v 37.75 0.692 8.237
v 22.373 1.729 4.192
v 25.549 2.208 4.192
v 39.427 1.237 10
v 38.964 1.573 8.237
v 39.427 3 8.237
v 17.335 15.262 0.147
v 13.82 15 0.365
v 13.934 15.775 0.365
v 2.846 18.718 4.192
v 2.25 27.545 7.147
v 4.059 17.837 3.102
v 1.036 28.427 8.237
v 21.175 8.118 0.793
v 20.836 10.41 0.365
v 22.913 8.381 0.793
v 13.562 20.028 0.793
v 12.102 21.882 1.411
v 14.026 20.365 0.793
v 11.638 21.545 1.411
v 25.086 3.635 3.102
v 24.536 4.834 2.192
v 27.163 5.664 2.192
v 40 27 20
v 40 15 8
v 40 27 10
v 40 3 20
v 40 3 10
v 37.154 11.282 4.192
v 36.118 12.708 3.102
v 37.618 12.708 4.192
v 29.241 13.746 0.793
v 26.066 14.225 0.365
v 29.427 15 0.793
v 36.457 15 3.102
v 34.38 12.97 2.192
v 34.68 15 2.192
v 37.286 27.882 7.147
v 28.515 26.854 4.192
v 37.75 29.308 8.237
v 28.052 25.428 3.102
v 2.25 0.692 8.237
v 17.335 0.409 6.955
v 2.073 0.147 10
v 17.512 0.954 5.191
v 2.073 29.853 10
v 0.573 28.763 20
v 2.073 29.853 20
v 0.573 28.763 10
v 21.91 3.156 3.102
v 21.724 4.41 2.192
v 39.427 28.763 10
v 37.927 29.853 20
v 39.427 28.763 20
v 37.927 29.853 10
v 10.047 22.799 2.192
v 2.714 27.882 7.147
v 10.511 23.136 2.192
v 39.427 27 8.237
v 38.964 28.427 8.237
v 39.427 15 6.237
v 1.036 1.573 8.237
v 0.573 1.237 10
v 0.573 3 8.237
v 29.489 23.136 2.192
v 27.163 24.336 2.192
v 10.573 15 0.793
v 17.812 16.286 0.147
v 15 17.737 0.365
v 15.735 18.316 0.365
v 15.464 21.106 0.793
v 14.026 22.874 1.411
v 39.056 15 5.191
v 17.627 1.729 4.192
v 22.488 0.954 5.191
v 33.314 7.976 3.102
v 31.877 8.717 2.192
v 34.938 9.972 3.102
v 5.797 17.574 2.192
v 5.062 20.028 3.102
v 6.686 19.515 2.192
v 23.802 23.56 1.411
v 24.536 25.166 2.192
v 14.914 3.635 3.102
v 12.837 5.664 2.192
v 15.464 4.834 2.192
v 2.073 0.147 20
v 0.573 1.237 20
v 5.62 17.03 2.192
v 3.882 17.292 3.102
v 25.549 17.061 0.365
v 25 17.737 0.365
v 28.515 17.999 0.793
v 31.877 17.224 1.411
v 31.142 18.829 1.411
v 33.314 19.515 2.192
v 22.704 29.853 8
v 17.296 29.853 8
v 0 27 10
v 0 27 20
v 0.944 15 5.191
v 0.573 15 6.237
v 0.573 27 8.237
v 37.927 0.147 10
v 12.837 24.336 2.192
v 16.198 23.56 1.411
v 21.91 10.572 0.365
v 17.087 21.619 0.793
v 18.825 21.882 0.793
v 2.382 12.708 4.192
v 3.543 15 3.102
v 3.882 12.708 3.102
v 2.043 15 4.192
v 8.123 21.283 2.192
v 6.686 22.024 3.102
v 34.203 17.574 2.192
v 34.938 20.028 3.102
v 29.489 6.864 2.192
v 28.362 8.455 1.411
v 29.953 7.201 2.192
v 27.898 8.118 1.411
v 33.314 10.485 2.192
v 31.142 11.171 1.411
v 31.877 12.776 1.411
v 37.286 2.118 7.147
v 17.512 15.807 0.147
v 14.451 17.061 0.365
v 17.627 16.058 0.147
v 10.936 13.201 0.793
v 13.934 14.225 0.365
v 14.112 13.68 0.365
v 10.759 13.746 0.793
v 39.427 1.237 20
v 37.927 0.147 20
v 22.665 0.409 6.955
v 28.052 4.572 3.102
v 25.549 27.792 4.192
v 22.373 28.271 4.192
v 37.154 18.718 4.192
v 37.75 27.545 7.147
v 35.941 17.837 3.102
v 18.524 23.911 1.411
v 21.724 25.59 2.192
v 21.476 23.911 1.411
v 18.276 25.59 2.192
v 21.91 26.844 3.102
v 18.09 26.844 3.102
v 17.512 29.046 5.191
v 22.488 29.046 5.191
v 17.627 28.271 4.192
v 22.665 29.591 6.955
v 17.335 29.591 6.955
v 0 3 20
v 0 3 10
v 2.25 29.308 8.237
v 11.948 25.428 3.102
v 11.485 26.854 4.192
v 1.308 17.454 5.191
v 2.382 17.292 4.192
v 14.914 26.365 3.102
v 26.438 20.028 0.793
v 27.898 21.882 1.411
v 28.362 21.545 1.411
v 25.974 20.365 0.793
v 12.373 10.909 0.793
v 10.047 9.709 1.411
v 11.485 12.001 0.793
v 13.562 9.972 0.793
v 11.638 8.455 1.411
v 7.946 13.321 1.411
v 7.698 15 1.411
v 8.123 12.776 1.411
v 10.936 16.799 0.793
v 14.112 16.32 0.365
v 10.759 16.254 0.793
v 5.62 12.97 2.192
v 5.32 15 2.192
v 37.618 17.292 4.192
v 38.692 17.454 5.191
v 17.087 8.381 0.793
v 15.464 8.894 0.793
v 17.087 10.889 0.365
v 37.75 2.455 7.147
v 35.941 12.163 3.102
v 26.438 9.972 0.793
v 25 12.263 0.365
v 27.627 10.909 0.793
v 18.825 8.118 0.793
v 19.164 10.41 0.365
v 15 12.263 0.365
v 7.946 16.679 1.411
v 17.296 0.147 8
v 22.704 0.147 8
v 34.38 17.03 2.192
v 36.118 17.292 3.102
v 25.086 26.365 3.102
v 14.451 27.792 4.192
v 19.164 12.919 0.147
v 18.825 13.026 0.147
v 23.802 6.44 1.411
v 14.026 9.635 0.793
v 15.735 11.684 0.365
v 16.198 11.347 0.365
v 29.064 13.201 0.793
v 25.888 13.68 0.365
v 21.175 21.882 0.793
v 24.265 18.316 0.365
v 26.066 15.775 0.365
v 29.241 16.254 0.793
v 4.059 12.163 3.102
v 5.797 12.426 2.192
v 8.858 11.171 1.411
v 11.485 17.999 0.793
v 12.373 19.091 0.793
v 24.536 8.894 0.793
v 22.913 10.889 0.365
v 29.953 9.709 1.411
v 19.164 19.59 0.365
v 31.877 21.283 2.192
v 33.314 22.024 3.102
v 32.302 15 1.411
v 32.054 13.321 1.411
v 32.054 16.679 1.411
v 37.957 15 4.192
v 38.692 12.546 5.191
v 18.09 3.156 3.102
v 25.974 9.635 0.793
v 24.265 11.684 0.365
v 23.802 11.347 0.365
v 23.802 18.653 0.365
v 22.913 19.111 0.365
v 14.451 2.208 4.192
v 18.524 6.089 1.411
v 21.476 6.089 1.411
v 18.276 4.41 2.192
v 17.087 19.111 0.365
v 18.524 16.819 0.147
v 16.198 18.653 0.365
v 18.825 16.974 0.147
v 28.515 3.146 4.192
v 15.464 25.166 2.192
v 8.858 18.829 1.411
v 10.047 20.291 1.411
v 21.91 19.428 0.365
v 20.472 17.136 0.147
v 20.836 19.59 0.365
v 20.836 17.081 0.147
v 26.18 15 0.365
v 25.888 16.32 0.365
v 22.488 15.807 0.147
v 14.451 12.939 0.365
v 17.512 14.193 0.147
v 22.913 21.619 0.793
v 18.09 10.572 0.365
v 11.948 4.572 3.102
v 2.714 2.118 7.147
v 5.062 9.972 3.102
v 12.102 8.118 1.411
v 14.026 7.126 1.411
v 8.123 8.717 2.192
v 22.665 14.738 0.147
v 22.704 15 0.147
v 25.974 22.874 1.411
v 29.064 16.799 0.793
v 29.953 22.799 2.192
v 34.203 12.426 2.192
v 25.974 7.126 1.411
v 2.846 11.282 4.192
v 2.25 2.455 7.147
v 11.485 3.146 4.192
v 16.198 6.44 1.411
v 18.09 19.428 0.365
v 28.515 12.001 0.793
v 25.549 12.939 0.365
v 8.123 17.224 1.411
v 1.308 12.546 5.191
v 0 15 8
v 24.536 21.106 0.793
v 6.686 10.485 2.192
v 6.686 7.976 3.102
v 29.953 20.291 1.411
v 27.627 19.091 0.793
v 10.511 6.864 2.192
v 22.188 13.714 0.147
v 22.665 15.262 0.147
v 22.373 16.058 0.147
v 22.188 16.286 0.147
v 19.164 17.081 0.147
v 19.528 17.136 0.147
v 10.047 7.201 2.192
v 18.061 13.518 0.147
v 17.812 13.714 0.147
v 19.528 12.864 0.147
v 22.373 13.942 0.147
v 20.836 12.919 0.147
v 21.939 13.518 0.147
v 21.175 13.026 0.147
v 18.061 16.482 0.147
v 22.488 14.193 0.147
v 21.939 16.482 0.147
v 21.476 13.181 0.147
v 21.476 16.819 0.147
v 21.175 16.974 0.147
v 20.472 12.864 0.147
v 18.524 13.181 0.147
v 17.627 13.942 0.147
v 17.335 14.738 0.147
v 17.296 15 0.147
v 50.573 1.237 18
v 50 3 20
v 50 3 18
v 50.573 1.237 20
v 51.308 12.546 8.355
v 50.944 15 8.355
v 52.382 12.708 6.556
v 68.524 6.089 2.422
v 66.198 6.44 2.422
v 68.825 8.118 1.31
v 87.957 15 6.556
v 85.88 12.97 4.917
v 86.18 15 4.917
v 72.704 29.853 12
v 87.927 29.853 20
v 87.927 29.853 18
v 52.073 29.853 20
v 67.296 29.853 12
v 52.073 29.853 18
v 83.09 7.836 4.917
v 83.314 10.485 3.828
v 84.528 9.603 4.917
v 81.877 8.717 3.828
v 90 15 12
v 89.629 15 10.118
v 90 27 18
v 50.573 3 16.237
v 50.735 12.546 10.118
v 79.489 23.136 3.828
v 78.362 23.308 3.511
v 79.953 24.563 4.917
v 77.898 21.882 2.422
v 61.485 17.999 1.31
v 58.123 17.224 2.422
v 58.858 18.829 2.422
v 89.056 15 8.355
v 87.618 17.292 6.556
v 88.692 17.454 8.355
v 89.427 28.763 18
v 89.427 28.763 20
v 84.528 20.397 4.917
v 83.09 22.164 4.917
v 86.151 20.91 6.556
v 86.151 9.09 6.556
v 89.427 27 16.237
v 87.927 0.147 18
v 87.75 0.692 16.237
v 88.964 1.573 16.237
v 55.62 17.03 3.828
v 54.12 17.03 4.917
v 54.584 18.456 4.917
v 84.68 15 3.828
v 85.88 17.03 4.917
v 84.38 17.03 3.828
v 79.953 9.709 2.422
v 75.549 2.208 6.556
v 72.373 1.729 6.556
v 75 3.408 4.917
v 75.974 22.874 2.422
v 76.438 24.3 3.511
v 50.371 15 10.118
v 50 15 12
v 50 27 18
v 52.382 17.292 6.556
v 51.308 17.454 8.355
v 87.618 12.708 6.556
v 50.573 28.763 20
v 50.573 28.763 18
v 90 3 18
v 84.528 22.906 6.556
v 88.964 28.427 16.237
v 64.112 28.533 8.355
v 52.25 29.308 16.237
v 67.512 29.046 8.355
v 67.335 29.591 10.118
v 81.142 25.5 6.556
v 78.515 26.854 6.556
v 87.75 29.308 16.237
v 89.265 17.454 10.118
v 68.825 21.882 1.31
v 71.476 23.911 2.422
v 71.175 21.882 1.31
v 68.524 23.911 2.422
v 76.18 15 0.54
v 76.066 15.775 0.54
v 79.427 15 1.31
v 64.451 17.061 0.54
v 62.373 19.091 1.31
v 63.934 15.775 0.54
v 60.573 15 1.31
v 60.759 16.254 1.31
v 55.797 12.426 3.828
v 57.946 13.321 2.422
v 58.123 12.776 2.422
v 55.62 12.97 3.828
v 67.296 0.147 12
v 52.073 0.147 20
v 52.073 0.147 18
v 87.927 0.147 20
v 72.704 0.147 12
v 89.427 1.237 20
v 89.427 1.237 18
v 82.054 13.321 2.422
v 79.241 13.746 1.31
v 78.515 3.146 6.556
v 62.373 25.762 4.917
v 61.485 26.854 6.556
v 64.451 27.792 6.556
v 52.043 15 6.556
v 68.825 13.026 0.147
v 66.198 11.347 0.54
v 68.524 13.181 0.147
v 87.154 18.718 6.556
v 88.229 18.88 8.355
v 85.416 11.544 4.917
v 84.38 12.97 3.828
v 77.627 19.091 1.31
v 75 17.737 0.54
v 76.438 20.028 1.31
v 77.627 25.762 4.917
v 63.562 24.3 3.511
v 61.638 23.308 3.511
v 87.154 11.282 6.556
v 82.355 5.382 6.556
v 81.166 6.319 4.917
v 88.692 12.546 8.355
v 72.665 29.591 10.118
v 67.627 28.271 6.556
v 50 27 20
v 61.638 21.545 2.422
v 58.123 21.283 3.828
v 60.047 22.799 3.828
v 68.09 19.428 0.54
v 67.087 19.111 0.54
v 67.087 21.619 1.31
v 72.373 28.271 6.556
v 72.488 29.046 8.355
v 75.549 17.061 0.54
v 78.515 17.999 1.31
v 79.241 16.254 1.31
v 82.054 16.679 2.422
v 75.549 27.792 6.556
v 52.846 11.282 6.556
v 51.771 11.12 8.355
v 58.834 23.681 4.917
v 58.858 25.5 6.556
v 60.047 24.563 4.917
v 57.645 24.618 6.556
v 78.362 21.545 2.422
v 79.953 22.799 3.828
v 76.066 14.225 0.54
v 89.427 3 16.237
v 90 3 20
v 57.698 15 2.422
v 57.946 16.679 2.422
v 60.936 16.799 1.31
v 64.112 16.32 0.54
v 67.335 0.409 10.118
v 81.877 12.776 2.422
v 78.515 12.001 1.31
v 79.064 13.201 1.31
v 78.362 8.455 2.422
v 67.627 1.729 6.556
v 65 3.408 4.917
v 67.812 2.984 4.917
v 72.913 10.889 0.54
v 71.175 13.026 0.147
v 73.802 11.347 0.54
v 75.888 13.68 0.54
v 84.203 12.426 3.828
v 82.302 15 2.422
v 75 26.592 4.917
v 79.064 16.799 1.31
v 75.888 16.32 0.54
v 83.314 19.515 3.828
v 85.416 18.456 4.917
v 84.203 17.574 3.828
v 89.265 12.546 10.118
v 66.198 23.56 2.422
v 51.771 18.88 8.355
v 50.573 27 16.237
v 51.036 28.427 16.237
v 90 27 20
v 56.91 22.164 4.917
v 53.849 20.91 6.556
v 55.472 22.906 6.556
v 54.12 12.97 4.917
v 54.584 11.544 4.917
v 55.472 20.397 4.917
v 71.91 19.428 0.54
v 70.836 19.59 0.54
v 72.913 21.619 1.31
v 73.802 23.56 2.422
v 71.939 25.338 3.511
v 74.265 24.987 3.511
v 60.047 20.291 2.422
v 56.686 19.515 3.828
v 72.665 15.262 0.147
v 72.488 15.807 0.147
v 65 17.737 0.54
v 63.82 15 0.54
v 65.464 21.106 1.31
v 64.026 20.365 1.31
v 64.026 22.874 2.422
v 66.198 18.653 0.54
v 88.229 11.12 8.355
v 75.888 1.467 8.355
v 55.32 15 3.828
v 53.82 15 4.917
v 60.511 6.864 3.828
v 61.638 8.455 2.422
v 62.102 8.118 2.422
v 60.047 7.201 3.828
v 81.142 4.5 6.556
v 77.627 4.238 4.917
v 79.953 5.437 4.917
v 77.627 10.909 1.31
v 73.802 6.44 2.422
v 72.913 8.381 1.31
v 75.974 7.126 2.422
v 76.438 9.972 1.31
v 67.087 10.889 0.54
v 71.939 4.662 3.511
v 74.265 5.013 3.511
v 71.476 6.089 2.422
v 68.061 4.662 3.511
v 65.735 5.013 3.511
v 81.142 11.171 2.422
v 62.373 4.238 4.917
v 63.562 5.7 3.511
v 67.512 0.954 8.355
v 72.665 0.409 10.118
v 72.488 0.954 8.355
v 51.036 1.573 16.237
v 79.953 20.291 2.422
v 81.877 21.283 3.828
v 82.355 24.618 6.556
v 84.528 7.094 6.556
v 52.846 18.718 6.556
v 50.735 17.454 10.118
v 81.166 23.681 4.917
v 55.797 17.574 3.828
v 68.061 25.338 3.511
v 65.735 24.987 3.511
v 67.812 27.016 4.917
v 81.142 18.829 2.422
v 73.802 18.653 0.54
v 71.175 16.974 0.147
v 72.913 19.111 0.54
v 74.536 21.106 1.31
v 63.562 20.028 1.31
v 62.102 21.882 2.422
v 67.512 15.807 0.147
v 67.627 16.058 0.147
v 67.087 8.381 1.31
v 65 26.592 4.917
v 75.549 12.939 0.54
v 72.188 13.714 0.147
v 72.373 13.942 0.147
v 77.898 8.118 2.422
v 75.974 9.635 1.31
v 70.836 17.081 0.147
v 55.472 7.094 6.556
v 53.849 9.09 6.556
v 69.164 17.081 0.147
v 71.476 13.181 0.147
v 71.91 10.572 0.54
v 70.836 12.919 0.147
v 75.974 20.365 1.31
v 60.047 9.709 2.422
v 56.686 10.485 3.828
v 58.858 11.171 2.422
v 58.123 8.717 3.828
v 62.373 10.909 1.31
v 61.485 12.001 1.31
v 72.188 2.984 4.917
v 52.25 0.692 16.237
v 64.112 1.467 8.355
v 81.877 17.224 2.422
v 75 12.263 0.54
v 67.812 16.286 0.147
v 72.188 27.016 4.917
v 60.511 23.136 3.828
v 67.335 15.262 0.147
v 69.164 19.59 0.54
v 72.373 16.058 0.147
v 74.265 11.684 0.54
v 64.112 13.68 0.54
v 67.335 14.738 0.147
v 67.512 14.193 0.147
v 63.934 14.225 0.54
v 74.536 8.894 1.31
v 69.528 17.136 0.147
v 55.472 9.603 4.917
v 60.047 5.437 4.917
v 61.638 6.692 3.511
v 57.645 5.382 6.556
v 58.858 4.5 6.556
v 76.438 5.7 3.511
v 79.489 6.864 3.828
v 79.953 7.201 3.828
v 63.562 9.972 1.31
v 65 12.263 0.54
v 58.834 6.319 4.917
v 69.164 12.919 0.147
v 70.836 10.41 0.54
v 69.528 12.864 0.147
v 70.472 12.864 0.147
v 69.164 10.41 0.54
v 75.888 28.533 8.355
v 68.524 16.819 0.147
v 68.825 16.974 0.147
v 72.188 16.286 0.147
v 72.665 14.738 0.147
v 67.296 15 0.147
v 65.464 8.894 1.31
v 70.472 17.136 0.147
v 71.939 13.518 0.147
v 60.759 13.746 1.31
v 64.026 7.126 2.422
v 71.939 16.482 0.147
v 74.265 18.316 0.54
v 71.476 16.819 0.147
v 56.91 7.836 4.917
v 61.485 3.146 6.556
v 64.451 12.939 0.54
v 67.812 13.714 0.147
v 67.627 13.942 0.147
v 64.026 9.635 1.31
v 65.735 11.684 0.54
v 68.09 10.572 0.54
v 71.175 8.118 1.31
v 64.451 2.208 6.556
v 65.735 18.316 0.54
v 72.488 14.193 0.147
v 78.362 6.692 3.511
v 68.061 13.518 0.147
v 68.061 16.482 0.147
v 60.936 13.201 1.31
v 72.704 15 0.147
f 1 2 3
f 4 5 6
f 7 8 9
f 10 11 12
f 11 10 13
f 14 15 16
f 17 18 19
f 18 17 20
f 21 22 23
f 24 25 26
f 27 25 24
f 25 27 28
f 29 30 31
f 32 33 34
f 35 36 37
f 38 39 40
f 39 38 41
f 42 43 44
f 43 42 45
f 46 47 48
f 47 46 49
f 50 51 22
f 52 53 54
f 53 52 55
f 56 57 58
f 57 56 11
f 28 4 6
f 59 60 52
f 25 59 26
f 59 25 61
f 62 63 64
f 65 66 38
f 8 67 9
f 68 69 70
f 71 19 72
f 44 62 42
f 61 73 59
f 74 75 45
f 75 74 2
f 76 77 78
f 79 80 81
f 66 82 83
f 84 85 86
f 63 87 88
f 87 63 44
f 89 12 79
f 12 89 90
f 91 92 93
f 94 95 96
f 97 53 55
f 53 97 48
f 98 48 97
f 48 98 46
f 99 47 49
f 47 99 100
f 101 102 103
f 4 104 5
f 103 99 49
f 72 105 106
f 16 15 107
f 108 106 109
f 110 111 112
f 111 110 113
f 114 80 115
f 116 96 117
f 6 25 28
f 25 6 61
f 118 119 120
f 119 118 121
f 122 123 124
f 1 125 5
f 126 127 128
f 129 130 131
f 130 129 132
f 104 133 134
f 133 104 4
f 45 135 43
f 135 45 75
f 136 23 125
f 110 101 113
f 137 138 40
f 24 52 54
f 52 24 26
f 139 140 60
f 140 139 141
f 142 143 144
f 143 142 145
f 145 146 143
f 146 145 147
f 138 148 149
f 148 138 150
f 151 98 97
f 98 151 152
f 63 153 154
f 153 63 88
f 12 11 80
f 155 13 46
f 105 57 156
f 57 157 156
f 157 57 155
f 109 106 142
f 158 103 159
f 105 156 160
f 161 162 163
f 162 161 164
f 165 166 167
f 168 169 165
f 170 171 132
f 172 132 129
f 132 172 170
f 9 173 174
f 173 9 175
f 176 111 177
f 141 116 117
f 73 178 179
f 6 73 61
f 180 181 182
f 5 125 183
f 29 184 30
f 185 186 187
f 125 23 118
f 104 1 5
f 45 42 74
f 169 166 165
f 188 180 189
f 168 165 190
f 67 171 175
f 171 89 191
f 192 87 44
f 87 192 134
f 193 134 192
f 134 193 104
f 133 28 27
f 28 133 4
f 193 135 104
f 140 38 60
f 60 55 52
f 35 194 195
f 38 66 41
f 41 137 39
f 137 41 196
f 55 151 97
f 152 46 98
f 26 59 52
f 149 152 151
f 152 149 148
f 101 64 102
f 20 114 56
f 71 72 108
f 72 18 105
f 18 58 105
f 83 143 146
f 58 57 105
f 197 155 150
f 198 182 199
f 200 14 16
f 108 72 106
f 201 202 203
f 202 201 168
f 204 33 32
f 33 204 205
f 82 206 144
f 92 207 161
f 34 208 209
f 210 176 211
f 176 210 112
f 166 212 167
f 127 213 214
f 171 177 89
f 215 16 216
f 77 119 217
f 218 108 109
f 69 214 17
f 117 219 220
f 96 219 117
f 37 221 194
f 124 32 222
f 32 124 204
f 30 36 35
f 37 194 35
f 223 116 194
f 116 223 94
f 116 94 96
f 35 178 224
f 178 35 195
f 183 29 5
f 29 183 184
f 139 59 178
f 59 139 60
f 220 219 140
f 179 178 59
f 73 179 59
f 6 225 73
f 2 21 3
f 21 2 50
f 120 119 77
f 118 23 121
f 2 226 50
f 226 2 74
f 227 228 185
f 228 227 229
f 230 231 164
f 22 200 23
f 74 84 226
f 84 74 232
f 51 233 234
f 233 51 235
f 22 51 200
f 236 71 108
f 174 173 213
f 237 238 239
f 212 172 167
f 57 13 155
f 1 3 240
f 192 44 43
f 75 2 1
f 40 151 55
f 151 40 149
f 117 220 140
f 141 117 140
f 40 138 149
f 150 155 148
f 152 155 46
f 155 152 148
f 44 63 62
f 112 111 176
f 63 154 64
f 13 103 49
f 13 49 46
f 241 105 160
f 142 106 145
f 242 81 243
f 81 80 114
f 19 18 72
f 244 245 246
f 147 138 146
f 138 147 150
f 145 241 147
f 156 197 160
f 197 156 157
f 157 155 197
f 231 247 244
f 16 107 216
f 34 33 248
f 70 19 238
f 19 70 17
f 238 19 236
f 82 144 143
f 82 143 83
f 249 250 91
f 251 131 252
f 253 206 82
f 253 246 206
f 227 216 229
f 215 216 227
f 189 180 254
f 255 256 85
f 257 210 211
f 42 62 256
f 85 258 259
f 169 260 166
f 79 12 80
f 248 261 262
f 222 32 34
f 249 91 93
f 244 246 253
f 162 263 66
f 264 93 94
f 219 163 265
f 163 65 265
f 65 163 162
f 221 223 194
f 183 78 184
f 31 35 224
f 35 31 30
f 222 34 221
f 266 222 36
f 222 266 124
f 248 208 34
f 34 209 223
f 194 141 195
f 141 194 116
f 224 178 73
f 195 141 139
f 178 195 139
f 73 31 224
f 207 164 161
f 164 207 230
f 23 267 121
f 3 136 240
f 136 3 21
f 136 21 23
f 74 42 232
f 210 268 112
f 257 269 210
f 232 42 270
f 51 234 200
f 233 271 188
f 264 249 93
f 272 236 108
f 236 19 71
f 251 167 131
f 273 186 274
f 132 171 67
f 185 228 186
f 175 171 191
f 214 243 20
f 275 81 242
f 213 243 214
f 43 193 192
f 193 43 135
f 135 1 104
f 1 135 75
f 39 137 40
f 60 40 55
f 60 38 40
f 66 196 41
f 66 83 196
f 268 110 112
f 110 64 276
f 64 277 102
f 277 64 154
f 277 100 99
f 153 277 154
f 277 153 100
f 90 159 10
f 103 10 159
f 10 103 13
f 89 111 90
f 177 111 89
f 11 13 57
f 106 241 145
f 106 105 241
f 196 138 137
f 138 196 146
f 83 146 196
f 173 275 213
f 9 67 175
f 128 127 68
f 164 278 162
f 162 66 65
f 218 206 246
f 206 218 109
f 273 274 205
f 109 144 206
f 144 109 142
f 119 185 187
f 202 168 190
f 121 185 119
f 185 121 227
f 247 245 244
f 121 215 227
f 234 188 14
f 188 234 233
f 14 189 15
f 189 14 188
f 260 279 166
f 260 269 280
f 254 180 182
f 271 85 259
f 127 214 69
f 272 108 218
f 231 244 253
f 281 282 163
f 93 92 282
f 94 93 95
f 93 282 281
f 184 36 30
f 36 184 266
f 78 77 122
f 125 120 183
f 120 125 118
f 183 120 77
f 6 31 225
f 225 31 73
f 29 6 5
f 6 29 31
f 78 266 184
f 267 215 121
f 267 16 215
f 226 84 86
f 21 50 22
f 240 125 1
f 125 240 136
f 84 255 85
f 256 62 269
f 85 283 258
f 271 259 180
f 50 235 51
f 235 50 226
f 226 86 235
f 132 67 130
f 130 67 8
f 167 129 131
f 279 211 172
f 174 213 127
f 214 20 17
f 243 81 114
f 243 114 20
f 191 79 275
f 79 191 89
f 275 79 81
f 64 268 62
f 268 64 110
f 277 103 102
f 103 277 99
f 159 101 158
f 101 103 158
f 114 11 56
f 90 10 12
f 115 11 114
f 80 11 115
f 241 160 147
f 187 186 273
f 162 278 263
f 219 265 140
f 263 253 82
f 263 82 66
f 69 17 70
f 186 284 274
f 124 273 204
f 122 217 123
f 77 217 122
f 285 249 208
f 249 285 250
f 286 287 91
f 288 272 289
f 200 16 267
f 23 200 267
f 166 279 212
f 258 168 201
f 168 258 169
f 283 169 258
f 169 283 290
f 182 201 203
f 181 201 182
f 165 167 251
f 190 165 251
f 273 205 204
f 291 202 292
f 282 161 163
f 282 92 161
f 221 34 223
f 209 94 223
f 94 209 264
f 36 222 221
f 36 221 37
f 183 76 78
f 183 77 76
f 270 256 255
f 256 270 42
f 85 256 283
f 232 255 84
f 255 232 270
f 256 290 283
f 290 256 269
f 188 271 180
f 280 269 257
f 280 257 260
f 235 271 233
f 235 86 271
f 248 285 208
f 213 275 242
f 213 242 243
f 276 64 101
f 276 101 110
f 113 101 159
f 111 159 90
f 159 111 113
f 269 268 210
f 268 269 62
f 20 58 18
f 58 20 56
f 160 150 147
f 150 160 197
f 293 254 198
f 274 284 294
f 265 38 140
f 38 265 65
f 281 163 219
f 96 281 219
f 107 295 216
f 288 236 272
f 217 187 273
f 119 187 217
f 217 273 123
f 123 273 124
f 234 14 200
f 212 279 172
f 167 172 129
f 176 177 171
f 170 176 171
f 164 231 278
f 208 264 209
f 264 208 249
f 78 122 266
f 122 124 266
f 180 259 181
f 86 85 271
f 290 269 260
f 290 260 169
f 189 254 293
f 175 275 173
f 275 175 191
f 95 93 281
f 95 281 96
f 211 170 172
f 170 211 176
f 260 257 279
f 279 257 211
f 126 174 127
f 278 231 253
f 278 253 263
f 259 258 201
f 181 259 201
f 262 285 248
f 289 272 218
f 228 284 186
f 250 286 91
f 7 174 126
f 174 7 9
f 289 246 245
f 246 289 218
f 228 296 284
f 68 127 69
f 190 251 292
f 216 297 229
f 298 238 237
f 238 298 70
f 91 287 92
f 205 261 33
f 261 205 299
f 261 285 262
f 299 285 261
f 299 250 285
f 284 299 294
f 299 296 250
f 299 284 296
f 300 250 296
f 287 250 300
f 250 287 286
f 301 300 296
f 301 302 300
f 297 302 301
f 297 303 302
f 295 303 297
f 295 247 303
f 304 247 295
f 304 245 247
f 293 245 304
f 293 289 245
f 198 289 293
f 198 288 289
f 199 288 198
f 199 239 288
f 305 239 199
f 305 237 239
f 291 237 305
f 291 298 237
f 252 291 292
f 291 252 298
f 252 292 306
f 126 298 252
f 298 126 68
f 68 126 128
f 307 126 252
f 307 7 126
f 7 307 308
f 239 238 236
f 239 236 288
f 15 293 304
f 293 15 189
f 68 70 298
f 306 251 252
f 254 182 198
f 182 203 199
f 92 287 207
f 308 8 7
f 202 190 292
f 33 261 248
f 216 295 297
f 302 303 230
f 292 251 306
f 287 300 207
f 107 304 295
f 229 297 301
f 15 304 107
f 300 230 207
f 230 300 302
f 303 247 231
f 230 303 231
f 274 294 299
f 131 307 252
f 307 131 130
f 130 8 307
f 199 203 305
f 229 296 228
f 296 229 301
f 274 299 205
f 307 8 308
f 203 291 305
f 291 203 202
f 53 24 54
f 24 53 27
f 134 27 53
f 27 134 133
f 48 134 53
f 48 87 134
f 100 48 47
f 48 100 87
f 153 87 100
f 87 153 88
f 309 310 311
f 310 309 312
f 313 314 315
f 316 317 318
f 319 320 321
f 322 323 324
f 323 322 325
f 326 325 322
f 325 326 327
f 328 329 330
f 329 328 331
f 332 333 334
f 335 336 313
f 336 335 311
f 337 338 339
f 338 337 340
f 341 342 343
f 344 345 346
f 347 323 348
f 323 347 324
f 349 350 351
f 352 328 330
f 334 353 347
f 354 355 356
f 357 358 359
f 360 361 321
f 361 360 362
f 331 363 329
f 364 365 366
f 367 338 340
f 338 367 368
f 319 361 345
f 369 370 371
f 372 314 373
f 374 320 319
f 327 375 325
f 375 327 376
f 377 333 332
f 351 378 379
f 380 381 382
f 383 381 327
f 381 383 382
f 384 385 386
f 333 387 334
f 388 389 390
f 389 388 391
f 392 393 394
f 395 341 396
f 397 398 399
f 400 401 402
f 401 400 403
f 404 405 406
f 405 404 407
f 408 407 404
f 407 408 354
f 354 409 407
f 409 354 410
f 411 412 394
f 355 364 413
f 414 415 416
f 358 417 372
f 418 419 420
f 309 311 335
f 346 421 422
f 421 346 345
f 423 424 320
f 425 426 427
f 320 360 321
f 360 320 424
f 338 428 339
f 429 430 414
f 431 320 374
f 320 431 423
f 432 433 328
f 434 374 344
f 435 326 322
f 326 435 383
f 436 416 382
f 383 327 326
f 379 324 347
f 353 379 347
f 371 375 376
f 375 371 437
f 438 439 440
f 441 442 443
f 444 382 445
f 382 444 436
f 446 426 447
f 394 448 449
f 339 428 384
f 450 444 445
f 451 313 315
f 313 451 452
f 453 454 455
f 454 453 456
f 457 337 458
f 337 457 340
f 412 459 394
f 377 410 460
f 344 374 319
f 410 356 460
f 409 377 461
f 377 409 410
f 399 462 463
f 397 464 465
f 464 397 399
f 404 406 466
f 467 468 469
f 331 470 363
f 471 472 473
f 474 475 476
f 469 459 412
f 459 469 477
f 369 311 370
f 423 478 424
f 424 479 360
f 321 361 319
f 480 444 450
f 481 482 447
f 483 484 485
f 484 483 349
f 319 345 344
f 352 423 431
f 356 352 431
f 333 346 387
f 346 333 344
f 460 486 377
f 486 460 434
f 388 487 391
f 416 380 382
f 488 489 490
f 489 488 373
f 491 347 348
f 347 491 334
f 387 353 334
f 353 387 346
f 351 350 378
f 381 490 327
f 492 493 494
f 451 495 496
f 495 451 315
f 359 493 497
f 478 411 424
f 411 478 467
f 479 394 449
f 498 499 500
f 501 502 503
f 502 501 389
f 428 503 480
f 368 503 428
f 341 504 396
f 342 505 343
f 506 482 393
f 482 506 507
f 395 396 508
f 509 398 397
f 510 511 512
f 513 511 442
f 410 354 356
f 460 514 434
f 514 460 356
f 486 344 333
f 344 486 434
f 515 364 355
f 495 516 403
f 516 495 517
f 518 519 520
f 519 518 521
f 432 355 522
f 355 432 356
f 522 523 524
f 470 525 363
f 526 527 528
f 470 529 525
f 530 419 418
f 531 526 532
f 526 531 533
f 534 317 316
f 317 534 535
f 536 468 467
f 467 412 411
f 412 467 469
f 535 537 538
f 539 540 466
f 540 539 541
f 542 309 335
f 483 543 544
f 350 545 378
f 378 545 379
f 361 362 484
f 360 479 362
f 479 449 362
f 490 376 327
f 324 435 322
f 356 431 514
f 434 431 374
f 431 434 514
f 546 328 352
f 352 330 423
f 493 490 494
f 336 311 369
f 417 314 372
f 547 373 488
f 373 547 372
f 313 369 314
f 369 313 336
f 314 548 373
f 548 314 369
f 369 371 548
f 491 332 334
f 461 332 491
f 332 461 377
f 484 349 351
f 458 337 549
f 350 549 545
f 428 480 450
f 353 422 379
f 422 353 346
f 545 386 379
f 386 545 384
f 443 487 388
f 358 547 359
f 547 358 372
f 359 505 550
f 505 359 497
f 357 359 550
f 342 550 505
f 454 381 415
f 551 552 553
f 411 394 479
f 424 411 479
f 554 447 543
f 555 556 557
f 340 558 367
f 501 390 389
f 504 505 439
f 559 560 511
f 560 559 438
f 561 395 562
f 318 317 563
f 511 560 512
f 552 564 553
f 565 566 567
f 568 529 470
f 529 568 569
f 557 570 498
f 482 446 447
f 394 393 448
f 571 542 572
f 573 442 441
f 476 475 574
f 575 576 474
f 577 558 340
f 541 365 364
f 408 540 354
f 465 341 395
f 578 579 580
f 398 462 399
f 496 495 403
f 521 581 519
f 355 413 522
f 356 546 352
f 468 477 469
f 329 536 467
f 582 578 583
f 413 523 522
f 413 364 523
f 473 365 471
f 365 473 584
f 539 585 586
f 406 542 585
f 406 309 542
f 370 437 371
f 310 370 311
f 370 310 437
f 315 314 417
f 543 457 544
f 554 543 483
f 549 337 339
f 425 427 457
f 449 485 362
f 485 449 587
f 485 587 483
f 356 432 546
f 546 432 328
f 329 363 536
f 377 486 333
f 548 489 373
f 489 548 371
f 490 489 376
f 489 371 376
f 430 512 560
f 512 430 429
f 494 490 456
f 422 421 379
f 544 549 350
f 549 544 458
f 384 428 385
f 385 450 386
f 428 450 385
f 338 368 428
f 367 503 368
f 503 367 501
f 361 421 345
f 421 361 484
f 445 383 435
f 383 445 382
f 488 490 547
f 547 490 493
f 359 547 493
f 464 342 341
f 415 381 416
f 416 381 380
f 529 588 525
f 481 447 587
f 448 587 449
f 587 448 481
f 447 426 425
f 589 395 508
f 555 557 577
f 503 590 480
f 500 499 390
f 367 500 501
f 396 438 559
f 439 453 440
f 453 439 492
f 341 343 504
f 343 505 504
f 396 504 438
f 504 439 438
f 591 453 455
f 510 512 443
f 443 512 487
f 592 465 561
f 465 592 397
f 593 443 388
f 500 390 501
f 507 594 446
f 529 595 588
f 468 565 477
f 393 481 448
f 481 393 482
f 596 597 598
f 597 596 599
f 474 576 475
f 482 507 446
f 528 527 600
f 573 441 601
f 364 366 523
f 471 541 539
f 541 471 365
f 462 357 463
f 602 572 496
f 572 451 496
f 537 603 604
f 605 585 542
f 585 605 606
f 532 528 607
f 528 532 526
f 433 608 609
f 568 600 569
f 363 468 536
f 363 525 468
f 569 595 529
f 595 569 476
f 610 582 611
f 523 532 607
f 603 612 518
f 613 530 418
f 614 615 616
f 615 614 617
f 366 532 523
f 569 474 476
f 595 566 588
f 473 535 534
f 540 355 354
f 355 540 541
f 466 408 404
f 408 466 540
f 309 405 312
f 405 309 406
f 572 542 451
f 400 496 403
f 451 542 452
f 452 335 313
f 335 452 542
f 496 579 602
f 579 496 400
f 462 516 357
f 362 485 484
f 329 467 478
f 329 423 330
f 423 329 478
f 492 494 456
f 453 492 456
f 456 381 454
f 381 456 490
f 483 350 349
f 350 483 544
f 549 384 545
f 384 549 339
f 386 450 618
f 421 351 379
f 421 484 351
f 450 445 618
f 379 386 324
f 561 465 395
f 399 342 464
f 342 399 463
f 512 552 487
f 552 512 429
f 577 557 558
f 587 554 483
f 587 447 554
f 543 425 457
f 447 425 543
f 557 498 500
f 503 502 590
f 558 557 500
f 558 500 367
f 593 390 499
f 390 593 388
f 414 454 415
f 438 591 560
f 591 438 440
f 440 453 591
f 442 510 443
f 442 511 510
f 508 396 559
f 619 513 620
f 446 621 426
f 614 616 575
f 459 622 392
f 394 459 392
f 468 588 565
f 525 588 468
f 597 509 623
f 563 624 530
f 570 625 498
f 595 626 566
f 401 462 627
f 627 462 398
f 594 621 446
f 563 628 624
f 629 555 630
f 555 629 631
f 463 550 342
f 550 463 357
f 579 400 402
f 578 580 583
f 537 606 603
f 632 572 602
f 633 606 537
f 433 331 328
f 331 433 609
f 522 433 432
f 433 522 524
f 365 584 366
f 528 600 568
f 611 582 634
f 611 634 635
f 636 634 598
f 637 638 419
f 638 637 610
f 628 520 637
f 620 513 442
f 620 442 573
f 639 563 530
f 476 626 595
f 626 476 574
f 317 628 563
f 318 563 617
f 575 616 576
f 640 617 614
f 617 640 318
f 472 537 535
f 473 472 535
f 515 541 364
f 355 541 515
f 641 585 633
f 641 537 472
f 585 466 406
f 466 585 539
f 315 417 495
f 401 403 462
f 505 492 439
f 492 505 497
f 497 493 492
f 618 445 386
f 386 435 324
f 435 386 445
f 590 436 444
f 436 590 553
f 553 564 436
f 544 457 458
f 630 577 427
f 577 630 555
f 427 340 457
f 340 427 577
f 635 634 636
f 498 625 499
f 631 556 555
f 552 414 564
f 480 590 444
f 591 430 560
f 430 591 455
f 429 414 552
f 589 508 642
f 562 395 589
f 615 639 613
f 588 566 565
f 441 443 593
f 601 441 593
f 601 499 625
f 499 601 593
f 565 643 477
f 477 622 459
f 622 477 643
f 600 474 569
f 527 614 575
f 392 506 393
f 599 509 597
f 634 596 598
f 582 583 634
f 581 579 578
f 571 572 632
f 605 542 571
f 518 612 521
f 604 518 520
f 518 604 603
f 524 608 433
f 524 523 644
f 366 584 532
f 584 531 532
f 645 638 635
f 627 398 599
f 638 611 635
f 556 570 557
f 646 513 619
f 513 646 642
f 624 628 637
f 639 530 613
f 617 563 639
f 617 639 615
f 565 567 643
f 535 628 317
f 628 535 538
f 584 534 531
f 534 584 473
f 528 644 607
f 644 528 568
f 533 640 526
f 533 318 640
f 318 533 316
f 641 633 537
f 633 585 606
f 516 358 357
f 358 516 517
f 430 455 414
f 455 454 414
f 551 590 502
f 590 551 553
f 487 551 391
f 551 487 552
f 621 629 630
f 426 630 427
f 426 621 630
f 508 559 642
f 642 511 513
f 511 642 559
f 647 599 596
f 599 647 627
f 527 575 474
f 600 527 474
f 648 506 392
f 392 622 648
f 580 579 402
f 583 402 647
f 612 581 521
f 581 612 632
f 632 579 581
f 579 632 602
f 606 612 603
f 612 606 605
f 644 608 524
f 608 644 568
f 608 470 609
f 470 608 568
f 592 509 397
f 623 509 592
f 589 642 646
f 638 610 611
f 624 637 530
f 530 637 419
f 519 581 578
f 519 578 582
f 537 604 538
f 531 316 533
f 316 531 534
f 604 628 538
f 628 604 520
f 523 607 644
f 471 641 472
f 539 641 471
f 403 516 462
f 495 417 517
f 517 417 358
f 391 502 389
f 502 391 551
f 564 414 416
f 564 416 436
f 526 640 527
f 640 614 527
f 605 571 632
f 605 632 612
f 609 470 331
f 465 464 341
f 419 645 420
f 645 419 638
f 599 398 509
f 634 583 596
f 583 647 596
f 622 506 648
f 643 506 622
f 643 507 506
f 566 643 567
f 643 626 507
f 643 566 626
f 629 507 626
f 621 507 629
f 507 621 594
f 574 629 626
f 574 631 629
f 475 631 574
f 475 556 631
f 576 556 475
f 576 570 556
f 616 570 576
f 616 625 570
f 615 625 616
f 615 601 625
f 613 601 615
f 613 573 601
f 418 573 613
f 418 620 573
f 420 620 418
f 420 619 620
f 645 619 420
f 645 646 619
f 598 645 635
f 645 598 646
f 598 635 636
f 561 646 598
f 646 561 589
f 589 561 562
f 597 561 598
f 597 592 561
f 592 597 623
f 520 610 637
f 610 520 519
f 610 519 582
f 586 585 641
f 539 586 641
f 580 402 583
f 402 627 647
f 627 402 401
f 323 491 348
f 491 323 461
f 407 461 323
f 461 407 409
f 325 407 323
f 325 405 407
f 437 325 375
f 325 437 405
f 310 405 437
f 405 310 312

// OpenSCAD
// file: ../../lib/primitive/dish.scad
$rounding = 3;
$bleed = 1;

default_dish_ratio = 0.5;

module dish (size, dish_ratio=default_dish_ratio) {
  width = size[0];
  length = size[1];
  height = size[2];

  r_width = width - $rounding * 2;
  r_length = length - $rounding * 2;
  r_height = height - $rounding * 2;
  cube_ratio = 1 - dish_ratio;

  radius = min(r_width,r_length);

  difference() {
    translate([$rounding,$rounding,$rounding]) {
      minkowski() {
        hull() {
          translate([0,0,height * dish_ratio - $rounding]) {
            cube([r_width,r_length,height * cube_ratio]);
          }
          translate([r_width/2,r_length/2,height * dish_ratio / 2]) {
            resize([r_width,r_length,height * dish_ratio]) {
              sphere(radius);
            }
          }
        }
        sphere($rounding);
      }
    }

    translate([-$bleed,-$bleed,height]) {
      cube([
        width + $bleed * 2,
        length + $bleed * 2,
        $rounding + $bleed
      ]);
    }
  }
}
// main file
include <../../lib/primitive/dish.scad>

dish([40, 30, 20]);

translate([50, 0, 0]) {
  dish([40, 30, 20], 0.9);
}
